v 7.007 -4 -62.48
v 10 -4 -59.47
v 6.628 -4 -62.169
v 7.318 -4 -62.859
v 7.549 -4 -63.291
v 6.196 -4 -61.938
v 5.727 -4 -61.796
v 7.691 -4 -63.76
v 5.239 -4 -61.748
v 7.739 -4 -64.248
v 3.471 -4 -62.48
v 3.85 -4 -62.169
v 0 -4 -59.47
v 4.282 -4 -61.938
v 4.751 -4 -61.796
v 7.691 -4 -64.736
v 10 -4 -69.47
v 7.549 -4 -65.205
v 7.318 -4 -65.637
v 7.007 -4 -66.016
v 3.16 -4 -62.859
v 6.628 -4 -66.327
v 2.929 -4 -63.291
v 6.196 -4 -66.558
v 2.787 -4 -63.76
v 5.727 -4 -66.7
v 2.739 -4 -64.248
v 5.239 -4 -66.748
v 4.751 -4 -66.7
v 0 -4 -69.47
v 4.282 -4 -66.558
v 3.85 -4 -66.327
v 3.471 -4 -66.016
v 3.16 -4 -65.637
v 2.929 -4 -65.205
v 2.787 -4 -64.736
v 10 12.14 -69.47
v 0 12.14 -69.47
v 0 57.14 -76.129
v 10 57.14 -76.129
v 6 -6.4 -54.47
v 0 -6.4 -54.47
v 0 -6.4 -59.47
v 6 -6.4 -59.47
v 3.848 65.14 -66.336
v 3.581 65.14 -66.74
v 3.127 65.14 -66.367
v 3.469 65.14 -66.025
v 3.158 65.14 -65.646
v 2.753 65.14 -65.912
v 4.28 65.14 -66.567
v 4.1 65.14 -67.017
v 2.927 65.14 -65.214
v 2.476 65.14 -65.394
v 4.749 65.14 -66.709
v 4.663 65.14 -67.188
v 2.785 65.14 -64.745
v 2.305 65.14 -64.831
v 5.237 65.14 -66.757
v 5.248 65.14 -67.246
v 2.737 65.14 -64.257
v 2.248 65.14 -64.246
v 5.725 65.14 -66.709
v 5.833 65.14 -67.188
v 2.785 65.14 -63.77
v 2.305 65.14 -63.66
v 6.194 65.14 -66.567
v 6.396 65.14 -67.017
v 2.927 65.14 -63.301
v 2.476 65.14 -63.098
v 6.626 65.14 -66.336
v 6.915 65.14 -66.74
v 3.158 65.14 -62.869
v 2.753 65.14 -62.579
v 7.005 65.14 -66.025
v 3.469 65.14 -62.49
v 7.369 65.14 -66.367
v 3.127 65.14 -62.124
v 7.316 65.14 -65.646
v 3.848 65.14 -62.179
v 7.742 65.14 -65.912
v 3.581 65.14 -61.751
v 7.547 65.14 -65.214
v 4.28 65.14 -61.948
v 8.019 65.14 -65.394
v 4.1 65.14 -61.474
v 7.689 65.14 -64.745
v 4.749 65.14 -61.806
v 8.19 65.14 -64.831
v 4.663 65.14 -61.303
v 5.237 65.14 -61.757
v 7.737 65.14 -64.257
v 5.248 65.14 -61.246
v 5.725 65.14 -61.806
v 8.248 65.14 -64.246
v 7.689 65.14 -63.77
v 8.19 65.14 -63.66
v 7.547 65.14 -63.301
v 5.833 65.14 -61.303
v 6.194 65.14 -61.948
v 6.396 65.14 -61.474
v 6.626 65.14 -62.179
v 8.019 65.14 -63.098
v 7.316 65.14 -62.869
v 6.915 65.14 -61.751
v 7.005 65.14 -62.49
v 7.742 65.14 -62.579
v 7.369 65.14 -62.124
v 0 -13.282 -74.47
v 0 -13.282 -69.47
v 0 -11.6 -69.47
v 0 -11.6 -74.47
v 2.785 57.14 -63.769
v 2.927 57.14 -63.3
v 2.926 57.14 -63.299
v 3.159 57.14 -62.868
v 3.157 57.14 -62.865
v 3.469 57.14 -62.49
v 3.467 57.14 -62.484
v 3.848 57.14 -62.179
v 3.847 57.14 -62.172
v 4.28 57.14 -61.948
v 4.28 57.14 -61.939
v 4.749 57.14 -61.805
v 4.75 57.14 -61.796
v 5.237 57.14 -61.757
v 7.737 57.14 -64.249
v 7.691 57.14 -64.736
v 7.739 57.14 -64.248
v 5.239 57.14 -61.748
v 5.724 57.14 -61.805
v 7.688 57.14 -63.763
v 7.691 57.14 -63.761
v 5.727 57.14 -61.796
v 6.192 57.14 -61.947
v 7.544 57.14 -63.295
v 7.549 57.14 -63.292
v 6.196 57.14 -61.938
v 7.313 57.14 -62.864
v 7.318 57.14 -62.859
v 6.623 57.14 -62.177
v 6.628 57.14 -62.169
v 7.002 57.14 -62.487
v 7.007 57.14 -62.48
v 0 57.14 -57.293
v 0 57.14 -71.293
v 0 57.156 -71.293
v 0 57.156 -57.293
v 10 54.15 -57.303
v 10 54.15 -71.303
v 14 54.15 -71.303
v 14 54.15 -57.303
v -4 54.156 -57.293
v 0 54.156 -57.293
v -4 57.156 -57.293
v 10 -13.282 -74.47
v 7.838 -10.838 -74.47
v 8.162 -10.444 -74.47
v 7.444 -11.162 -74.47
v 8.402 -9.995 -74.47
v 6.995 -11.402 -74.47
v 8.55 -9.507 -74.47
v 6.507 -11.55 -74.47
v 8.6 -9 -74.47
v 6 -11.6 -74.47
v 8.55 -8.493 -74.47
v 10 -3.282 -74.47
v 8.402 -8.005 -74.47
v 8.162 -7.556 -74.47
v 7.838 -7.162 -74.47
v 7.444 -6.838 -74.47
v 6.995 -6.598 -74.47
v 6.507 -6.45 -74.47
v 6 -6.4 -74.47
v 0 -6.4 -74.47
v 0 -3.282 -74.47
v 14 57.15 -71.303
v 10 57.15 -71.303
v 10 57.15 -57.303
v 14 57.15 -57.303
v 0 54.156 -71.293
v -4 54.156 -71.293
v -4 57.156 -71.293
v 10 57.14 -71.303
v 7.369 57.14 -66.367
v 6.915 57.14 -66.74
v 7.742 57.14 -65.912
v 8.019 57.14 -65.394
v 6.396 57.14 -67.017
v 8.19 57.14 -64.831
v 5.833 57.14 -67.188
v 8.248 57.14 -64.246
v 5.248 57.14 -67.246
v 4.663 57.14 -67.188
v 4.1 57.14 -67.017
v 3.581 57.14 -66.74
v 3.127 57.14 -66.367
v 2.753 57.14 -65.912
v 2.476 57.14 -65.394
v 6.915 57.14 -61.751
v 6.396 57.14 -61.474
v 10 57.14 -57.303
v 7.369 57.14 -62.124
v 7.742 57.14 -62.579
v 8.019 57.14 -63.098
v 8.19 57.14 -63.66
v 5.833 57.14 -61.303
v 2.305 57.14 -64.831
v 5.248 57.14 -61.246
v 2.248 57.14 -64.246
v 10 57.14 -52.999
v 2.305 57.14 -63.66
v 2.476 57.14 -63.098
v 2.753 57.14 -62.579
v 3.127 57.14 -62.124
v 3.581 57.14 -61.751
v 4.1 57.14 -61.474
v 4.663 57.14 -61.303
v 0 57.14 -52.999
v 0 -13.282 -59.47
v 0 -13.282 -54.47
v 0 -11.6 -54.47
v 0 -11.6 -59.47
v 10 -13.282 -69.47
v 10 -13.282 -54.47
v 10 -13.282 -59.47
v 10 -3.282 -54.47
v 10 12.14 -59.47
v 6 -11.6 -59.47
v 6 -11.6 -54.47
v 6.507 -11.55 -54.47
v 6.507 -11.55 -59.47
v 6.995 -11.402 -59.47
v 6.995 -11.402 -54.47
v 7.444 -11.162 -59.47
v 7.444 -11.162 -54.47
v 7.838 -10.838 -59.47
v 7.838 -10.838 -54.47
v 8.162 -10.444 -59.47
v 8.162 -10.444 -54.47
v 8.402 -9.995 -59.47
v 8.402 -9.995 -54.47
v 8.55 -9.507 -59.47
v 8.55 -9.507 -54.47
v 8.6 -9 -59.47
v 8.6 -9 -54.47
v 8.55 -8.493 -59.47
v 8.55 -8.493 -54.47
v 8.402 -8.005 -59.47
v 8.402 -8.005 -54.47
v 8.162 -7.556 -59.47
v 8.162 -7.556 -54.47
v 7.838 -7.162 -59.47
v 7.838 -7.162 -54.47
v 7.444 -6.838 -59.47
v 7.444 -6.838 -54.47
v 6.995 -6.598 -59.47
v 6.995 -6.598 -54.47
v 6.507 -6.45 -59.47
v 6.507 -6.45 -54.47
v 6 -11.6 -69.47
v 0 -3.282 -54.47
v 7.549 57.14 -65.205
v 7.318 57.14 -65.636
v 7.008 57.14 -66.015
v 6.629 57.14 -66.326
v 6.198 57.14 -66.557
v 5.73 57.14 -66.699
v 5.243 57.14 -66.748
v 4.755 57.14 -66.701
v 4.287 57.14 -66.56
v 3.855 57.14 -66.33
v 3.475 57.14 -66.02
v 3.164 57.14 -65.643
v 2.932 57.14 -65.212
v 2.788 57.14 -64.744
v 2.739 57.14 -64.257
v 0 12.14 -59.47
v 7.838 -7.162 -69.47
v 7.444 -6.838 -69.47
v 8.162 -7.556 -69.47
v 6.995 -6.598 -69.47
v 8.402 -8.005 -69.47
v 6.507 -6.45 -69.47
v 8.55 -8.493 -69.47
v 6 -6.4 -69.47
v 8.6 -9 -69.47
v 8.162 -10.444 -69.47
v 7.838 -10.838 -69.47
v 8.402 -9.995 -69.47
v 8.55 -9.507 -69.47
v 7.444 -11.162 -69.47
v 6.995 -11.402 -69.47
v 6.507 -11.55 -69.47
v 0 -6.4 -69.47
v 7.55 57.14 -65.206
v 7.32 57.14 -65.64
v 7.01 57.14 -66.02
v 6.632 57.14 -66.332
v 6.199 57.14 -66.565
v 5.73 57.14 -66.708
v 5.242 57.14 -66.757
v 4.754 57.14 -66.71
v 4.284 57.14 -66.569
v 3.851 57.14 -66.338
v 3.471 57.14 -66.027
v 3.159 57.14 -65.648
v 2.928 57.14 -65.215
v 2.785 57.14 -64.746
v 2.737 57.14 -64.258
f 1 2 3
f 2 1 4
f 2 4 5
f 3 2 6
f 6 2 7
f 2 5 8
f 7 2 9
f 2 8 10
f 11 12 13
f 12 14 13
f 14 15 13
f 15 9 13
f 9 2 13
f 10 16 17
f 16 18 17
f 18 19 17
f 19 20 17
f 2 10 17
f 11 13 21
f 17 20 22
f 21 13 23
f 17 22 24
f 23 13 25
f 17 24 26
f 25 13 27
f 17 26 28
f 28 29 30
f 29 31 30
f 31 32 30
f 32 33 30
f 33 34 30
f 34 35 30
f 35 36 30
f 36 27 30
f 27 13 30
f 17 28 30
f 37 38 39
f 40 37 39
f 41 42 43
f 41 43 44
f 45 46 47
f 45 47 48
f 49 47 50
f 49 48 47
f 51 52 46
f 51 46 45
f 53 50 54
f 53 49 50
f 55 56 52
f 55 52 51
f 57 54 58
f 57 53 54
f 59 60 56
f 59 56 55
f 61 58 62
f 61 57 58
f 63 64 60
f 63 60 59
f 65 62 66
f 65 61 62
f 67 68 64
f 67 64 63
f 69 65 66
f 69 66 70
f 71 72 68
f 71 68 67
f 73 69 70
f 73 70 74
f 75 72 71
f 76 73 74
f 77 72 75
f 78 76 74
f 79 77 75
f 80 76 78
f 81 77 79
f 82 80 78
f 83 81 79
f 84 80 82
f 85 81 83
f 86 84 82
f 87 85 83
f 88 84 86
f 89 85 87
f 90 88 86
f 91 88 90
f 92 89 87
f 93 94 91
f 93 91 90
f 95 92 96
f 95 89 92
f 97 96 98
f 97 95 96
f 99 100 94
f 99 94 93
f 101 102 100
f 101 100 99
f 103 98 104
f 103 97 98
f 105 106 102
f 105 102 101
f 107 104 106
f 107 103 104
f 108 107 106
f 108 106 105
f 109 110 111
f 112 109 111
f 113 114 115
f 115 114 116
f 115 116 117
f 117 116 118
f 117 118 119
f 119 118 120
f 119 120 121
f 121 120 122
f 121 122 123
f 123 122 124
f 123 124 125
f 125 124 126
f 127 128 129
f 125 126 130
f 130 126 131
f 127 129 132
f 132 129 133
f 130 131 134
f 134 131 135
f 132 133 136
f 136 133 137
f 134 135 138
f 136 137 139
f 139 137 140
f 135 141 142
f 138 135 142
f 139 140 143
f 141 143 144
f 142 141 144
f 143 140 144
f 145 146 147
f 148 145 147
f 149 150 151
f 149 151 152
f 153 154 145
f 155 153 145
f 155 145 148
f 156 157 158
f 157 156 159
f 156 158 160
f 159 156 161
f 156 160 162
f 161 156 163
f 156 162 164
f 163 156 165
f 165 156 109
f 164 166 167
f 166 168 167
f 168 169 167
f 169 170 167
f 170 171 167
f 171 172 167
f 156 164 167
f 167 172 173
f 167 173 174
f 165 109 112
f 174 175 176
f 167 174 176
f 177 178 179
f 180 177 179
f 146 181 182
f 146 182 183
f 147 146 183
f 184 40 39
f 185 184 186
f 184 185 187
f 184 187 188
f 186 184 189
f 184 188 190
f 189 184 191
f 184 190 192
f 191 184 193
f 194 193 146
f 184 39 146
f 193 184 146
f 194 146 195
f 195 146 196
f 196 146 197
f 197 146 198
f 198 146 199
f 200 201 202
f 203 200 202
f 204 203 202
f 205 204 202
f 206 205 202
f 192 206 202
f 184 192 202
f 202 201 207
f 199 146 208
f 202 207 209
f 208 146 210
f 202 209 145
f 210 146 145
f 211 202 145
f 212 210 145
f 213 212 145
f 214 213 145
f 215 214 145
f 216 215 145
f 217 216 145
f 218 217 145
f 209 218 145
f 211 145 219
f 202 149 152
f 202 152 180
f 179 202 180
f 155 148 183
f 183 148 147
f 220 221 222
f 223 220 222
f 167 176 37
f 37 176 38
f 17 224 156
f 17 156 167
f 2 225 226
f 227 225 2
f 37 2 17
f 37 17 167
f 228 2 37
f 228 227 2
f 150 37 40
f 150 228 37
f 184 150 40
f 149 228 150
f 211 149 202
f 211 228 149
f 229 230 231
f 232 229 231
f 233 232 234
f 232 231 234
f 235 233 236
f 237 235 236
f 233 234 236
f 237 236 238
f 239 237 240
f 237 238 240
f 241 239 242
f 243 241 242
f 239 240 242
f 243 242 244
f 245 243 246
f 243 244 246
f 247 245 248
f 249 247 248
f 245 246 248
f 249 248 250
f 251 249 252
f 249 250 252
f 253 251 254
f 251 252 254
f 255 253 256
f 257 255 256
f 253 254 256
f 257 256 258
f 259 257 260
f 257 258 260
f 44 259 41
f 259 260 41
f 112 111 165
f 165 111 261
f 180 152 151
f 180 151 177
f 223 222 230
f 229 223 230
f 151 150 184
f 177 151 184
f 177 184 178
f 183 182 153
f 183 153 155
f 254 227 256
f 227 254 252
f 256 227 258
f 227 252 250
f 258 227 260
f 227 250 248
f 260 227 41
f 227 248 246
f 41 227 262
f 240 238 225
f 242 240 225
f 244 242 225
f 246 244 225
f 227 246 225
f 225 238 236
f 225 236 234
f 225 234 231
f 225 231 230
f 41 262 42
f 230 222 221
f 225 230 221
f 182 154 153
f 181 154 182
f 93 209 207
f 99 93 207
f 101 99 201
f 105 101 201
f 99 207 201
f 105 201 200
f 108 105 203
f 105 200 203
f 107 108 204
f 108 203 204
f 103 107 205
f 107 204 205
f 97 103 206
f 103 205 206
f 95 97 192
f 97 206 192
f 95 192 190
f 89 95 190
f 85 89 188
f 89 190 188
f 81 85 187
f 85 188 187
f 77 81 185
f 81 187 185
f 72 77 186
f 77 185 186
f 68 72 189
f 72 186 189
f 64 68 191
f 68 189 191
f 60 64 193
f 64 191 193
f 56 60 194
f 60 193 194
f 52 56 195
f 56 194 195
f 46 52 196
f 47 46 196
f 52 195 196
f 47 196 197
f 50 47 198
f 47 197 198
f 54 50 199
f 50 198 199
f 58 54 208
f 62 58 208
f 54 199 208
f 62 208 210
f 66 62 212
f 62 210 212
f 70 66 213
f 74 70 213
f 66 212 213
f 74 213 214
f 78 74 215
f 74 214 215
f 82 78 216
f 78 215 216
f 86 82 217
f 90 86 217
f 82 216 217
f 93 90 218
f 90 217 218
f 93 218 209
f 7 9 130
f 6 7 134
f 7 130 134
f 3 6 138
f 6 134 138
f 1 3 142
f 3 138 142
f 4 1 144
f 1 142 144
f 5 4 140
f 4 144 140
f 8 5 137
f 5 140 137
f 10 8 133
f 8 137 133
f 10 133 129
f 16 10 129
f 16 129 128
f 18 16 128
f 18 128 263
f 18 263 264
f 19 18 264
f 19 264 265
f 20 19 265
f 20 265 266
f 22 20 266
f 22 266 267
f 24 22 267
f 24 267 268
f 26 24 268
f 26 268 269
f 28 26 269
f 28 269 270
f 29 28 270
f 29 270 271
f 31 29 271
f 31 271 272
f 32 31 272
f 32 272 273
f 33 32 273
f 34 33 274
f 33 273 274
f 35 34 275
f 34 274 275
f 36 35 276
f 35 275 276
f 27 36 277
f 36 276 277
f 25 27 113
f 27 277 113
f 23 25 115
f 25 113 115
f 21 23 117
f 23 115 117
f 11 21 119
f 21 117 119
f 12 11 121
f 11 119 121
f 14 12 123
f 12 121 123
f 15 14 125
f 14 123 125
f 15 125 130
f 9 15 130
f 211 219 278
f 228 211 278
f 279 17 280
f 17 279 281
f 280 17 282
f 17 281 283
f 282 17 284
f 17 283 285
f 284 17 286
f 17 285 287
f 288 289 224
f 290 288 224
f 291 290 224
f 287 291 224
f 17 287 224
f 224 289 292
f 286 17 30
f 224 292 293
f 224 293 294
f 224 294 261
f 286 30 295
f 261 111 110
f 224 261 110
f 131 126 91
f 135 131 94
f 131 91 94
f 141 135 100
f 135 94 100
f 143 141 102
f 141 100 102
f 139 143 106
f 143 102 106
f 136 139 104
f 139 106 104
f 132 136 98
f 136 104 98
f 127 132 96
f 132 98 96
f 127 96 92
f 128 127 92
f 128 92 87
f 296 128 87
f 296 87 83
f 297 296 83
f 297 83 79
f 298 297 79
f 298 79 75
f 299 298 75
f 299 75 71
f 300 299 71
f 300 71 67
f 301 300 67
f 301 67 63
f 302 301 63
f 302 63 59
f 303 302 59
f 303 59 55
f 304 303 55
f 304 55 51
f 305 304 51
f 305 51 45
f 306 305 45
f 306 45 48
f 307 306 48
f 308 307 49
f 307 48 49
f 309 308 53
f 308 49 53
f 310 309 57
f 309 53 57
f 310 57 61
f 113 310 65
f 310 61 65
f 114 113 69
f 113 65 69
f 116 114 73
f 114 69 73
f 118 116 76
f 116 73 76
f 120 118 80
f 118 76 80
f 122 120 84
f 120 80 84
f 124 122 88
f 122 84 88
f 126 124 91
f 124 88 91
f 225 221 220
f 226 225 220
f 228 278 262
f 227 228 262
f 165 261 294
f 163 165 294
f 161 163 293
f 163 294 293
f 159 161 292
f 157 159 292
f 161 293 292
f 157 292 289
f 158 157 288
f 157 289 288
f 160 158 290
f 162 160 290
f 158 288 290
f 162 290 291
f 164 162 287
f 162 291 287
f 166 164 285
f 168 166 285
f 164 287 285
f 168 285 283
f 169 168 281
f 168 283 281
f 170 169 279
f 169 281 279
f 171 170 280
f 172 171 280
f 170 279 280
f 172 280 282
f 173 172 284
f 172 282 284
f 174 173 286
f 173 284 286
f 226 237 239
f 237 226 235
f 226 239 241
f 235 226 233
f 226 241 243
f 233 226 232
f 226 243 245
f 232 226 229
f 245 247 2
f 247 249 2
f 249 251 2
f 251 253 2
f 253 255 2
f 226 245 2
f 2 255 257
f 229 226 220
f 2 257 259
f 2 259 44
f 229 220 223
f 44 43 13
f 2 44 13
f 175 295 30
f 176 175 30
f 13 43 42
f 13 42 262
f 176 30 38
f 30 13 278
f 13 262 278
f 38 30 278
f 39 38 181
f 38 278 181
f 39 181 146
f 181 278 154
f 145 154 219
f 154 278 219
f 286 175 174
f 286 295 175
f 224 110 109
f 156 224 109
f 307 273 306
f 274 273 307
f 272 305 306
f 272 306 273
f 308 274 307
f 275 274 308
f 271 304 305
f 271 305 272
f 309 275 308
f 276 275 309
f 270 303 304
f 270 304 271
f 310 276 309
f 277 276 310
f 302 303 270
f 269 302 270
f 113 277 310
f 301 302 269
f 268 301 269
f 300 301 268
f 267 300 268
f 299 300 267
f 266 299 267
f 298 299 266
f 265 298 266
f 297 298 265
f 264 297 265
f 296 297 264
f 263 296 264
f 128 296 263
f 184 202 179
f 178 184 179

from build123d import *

# Parameters (mm, degrees)
PAD017_DEPTH    = 10
SKETCH043_R     = 2.5
HOLE004_DEPTH   = 74.4118637621
POCKET018_DEPTH = 21.6598644736
SKETCH071_R     = 3
PAD030_DEPTH    = 8
SKETCH072_R     = 2.5
POCKET034_DEPTH = 8
SKETCH073_W     = 3
SKETCH073_H     = 14
PAD031_DEPTH    = 4
SKETCH074_W     = 3
SKETCH074_H     = 14
PAD032_DEPTH    = 4


with BuildPart() as part:
    # Sketch041 → Pad017 (new body)
    with BuildSketch(Plane.YZ):
        Polygon((-9.2823155717, -17.4697729947), (-9.2823155717, -22.4697729947), (0, -22.4697729947), (0, -32.4697729947), (-9.2823155717, -32.4697729947), (-9.2823155717, -37.4697729947), (0.718202267, -37.4697729947), (16.14, -32.4697729947), (61.14, -39.1286374683), (61.14, -15.9992606277), (16.14, -22.4697729947), (0.718202267, -17.4697729947), align=None)
    extrude(amount=PAD017_DEPTH)

    # Sketch043 → Hole004 (cut, through all)
    with BuildSketch(Plane.ZX.offset(65.1285481904)):
        with Locations((-27.248053, 5.238883)):
            Circle(SKETCH043_R)
    extrude(amount=-HOLE004_DEPTH, mode=Mode.SUBTRACT)

    # Sketch044 (on Face2 of Hole004) → Pocket018 (cut, through all)
    with BuildSketch(Plane(origin=(0, 0, -17.4697729947), x_dir=(0, -1, 0), z_dir=(0, 0, 1))):
        with BuildLine():
            ThreePointArc((2.4, -6.9475921725), (5, -9.5475921725), (7.6, -6.9475921725))
            Line((7.6, -6.9475921725), (7.6, 6))
            ThreePointArc((7.6, 6), (5.0000000001, 8.6), (2.4, 6.0000000001))
            Line((2.4, -6.9475921725), (2.4, 6.0000000001))
        make_face()
    extrude(amount=-POCKET018_DEPTH, mode=Mode.SUBTRACT)

    # Sketch071 (on Face17 of Pocket018) → Pad030 (join)
    with BuildSketch(Plane.ZX.offset(61.14)):
        with Locations((-27.24572, 5.247846)):
            Circle(SKETCH071_R)
    extrude(amount=PAD030_DEPTH)

    # Sketch072 (on Face26 of Pad030) → Pocket034 (cut)
    with BuildSketch(Plane.ZX.offset(69.14)):
        with Locations((-27.257469, 5.237027)):
            Circle(SKETCH072_R)
    extrude(amount=-POCKET034_DEPTH, mode=Mode.SUBTRACT)

    # Sketch073 (on Face6 of Pocket034) → Pad031 (join)
    with BuildSketch(Plane(origin=(0, 0, 0), x_dir=(0, 1, 0), z_dir=(-1, 0, 0))):
        with Locations((59.6559768039, 27.292839)):
            Rectangle(SKETCH073_W, SKETCH073_H)
    extrude(amount=PAD031_DEPTH)

    # Sketch074 (on Face5 of Pad031) → Pad032 (join)
    with BuildSketch(Plane.YZ.offset(10)):
        with Locations((59.6497417125, -27.3033236781)):
            Rectangle(SKETCH074_W, SKETCH074_H)
    extrude(amount=PAD032_DEPTH)


with BuildPart() as part_1:
    # Body007 placement: moved
    add(part.part.moved(Location((0, -4, -37))))


solid = part_1.part
